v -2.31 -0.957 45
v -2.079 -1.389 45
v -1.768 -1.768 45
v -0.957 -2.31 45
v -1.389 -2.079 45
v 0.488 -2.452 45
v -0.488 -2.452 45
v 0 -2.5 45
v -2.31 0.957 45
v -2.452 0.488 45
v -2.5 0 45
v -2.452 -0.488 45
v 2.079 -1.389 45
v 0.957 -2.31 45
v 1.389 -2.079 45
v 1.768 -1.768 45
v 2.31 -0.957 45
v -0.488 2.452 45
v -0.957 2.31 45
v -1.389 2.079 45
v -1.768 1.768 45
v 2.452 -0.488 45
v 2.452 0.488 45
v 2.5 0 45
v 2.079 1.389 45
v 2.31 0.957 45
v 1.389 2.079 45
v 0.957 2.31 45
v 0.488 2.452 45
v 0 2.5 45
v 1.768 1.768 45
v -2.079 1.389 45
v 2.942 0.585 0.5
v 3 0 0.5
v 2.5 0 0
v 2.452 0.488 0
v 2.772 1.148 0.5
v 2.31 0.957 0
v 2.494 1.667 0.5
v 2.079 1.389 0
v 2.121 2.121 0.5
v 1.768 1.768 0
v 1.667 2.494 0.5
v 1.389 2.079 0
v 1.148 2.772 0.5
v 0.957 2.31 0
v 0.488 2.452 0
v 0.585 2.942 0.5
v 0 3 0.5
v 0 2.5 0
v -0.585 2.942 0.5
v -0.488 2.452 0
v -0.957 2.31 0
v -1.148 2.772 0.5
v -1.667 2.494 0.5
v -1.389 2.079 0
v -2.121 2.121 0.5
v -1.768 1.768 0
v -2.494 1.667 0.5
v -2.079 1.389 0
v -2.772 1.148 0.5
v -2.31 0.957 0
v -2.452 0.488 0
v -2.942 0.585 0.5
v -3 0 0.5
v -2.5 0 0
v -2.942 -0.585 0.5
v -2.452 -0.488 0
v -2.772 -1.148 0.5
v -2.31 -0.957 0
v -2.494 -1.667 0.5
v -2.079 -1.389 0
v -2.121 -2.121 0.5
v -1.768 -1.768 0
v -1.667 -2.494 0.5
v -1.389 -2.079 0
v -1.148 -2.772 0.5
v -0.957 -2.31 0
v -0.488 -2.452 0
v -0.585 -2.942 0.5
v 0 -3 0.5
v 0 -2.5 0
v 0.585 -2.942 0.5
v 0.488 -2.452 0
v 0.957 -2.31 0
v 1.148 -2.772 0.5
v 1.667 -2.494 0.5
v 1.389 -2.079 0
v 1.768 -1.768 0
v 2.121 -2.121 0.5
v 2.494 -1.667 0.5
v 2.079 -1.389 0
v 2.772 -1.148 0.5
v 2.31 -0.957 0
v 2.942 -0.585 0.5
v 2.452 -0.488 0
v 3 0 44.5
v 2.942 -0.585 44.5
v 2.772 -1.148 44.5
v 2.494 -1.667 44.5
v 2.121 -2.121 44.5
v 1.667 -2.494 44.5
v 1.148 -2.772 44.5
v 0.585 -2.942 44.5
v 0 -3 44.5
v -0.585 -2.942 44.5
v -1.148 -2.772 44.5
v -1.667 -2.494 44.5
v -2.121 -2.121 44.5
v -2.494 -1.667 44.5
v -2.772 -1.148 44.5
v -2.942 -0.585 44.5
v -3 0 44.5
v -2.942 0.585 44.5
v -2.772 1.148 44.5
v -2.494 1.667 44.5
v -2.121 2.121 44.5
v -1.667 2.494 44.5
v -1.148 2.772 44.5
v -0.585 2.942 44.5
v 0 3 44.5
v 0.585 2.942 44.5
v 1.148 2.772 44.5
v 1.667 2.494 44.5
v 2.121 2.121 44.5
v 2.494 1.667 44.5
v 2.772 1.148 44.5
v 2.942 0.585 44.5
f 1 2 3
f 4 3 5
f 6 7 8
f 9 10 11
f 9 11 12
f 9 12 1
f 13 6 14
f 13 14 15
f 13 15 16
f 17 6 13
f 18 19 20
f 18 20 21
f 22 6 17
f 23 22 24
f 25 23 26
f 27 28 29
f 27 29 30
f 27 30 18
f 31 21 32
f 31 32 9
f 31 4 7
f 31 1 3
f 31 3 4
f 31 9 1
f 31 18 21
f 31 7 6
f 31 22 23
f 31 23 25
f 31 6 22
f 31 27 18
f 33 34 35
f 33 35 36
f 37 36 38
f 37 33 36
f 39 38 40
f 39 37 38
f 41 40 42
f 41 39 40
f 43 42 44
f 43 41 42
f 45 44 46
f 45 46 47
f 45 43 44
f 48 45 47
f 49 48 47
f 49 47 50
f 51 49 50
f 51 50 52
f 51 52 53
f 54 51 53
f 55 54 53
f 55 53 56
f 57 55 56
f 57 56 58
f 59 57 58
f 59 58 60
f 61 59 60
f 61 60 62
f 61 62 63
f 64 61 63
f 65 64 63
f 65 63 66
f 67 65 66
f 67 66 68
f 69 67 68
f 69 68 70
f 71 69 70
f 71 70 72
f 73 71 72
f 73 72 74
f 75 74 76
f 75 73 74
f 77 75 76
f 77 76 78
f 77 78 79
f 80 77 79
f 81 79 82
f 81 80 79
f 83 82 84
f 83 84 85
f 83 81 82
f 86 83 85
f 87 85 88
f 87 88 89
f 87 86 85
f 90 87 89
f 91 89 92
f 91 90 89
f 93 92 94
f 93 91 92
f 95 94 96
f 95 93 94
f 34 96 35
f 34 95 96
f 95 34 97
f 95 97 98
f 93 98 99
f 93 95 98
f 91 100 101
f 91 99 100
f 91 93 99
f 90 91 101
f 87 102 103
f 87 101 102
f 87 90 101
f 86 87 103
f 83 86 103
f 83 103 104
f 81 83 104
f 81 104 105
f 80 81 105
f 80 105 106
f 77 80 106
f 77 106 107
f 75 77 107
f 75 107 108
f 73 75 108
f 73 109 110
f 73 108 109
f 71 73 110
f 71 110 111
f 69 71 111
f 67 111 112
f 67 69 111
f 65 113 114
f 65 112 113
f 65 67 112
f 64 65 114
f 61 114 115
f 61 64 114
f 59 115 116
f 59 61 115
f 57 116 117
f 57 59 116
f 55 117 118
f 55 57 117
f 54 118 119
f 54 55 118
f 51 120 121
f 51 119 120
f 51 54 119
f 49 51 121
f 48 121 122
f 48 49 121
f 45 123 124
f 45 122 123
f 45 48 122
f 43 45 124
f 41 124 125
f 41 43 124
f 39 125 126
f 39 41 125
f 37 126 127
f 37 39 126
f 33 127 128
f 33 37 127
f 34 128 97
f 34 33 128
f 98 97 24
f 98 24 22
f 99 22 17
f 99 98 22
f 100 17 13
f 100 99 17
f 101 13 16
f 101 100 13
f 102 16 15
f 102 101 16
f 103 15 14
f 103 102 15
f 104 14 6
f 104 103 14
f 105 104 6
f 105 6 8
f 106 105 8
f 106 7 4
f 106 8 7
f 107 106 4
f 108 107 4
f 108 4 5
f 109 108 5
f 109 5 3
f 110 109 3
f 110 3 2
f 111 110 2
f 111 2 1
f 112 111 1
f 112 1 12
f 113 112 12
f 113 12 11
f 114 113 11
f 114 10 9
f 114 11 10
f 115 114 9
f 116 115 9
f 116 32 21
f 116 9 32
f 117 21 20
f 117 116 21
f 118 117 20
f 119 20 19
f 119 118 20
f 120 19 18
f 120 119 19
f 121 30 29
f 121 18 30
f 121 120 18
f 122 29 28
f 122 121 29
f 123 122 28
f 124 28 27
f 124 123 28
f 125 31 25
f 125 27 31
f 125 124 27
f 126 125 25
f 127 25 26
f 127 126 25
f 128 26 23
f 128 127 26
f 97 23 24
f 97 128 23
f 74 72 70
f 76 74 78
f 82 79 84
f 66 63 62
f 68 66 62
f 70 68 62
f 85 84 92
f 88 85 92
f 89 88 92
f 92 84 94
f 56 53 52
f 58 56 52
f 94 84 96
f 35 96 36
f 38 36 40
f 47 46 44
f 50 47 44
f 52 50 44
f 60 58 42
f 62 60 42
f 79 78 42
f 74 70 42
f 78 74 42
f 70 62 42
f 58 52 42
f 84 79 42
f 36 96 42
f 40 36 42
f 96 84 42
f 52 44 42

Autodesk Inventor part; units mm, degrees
ref_plane "YZ Plane" through (0, 0, 0) normal (1, 0, 0) x (0, 1, 0)
ref_plane "XZ Plane" through (0, 0, 0) normal (0, 1, 0) x (-1, 0, 0)
ref_plane "XY Plane" through (0, 0, 0) normal (0, 0, 1) x (1, 0, 0)
sketch "Эскиз1" plane through (0, 0, 0) normal (0, 0, 1) x (1, 0, 0)
  circle A0 centre (0, 0) radius 3
  dimension "d0" = 6
extrude "Выдавливание1" add sketch "Эскиз1" along normal blind 45
chamfer "Фаска1" distance 0.5 angle 45 1 edges at (-3, 0, 45)
chamfer "Фаска2" distance 0.5 angle 45 1 edges at (-3, 0, 0)
properties part number "Штрифт" material "Сталь, углеродистая"
